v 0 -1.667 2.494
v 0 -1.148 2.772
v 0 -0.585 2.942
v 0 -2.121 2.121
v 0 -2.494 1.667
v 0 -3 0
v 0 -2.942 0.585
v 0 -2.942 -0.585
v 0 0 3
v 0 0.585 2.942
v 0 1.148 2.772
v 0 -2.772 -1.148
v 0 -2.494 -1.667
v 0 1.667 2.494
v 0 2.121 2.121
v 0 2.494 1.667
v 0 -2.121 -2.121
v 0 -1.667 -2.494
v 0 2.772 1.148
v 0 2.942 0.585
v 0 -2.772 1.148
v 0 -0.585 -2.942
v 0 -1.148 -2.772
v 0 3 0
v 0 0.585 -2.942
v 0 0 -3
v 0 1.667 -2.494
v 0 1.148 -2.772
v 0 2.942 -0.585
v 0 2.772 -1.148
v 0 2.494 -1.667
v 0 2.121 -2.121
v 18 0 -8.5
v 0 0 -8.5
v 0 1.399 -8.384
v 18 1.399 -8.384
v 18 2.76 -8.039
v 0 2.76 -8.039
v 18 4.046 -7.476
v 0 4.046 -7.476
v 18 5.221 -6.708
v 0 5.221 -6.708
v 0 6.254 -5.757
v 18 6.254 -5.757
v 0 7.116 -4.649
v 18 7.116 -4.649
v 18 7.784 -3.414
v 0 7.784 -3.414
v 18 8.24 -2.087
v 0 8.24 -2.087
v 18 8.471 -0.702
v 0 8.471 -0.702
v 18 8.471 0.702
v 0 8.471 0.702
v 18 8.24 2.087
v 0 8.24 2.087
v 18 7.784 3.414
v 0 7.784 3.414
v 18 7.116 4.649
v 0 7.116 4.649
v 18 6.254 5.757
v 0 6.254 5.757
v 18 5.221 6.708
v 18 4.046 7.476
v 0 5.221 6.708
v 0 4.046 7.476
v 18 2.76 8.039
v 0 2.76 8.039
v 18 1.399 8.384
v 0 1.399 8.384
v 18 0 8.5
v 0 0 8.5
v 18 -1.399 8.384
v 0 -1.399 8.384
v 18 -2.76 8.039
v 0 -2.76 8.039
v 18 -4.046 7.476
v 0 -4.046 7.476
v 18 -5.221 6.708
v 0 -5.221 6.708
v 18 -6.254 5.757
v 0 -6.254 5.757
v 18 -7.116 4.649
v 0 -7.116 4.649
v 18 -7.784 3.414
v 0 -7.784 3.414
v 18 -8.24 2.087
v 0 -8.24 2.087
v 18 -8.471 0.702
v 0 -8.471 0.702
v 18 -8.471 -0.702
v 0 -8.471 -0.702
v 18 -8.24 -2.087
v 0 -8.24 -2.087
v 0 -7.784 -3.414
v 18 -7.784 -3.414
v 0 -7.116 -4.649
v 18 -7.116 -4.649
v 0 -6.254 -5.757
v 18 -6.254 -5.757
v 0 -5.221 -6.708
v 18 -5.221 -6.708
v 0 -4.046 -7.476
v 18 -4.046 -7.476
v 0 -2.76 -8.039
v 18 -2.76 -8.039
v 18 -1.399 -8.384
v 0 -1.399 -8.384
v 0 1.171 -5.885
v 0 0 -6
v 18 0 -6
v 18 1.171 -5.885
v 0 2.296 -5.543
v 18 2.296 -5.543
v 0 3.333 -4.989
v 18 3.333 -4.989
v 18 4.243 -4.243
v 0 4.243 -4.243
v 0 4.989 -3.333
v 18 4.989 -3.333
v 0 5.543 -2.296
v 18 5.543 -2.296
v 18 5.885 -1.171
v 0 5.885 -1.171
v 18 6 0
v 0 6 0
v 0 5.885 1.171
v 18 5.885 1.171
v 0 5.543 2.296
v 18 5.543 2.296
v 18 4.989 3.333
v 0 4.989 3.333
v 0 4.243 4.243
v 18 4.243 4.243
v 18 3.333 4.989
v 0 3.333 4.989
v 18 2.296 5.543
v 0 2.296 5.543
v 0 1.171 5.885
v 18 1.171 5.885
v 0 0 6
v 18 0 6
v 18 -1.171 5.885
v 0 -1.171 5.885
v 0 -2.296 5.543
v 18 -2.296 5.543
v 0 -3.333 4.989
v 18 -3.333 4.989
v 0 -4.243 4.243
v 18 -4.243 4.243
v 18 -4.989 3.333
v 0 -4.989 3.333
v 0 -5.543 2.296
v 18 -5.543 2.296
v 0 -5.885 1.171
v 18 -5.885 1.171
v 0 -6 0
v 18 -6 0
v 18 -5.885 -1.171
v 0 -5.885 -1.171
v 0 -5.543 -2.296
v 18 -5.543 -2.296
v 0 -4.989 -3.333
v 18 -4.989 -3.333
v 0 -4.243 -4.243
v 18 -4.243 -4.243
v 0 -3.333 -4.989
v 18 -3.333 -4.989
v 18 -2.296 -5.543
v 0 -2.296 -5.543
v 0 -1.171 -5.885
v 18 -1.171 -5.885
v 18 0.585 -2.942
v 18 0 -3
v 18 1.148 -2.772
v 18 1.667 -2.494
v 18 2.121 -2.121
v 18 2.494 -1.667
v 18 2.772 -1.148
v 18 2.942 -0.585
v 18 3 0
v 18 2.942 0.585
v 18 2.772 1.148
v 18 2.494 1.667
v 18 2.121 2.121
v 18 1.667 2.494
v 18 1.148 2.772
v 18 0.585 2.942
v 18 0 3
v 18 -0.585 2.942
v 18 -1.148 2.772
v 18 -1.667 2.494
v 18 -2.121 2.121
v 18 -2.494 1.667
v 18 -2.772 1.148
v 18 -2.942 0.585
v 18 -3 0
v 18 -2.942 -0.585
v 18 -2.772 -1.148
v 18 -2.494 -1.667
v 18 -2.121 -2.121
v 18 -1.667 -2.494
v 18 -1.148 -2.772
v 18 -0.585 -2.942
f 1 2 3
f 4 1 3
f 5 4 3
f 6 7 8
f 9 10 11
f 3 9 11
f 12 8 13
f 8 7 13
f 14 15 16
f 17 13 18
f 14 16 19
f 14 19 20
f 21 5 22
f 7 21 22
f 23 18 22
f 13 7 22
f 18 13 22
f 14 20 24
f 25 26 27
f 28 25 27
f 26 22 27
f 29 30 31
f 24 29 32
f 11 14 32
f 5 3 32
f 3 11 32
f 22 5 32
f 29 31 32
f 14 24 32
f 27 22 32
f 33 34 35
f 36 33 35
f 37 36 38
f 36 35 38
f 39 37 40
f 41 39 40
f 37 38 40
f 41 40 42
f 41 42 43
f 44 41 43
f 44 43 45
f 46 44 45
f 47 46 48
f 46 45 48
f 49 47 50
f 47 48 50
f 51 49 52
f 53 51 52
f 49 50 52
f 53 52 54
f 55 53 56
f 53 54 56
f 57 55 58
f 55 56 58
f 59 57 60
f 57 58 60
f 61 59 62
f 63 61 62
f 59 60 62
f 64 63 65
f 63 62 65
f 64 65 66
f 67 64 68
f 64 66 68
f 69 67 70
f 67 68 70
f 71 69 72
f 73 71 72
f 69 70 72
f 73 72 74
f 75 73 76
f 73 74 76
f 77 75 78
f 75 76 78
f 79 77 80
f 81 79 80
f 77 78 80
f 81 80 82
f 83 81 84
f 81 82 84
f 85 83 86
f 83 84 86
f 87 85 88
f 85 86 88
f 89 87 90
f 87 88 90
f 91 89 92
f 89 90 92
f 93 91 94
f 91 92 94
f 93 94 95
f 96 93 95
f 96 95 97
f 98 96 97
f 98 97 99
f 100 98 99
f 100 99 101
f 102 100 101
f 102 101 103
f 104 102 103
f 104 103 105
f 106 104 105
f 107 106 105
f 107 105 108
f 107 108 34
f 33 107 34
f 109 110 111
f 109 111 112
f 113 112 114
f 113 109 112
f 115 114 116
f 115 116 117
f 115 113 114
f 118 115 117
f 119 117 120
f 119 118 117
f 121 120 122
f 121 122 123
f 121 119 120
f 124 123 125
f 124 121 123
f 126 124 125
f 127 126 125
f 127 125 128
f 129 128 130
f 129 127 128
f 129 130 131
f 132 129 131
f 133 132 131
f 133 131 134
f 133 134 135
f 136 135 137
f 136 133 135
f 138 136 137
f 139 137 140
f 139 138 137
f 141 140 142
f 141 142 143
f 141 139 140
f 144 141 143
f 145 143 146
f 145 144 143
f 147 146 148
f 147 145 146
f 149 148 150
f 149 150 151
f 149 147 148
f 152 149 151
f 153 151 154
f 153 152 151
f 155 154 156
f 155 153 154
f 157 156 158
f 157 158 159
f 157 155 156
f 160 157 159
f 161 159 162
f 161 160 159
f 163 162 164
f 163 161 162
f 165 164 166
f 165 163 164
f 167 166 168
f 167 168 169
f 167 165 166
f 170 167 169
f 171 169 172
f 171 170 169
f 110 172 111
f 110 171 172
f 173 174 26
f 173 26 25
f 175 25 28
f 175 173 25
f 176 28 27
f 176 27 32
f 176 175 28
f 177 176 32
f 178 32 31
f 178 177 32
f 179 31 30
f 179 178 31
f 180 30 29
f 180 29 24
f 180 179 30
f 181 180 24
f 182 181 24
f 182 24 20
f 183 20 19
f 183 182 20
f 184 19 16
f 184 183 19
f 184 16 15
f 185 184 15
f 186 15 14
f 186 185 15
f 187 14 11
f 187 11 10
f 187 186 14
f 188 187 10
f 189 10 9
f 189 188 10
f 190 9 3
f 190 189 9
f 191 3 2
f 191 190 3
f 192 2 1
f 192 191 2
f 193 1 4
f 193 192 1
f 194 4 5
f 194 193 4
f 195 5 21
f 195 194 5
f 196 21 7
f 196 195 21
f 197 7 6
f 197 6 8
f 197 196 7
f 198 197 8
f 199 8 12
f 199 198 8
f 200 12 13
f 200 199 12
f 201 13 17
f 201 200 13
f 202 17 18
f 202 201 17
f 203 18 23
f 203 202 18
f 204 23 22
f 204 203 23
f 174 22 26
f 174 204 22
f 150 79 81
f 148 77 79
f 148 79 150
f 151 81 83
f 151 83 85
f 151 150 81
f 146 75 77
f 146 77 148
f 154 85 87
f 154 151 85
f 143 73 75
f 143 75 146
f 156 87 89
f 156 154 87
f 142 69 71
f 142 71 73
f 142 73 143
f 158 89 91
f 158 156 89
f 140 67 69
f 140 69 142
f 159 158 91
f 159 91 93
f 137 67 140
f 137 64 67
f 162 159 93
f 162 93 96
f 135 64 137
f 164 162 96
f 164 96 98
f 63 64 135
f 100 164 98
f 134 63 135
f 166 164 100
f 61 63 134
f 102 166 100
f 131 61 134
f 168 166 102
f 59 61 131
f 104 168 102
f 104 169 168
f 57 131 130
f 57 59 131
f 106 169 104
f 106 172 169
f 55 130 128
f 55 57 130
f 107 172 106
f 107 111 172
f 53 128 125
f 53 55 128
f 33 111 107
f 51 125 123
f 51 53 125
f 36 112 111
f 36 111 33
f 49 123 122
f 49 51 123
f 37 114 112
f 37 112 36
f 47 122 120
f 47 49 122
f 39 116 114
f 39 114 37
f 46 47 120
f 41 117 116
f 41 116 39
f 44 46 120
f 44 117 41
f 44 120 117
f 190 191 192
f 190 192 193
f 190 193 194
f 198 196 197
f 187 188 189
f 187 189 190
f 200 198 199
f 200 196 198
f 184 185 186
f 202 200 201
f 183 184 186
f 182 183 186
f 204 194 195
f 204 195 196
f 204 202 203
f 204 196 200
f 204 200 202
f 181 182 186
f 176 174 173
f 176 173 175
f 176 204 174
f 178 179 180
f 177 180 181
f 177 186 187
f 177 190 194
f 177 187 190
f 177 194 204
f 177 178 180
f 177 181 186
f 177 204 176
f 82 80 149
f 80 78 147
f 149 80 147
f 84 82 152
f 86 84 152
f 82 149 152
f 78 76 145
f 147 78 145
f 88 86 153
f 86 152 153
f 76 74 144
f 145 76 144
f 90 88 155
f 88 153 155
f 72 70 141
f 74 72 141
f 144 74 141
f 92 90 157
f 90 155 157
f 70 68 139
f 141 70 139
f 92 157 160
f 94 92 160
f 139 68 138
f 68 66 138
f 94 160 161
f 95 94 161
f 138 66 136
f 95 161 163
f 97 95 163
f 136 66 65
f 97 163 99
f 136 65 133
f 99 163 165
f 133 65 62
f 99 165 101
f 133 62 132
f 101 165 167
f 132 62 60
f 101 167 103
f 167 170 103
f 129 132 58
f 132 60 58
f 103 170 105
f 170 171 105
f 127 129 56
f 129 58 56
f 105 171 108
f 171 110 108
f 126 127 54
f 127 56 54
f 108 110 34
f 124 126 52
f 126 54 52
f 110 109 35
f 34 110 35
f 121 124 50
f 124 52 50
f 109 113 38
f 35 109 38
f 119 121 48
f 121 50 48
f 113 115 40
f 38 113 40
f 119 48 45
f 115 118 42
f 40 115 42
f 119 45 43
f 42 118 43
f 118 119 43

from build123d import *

# Parameters (mm, degrees)
SKETCH1_R           = 8.5
SKETCH1_R_2         = 6
BOSS_EXTRUDE1_DEPTH = 18
SKETCH2_R           = 3
BOSS_EXTRUDE2_DEPTH = 18


with BuildPart() as part:
    # Sketch1 → Boss-Extrude1 (new body)
    with BuildSketch(Plane(origin=(0, 0, 0), x_dir=(0, 0, -1), z_dir=(1, 0, 0))):
        Circle(SKETCH1_R)
        Circle(SKETCH1_R_2, mode=Mode.SUBTRACT)
    extrude(amount=BOSS_EXTRUDE1_DEPTH)


with BuildPart() as body_2:
    # Sketch2 → Boss-Extrude2 (new body)
    with BuildSketch(Plane(origin=(18, 0, 0), x_dir=(0, 0, -1), z_dir=(1, 0, 0))):
        Circle(SKETCH2_R)
    extrude(amount=-BOSS_EXTRUDE2_DEPTH)


solid = Compound([part.part, body_2.part])
